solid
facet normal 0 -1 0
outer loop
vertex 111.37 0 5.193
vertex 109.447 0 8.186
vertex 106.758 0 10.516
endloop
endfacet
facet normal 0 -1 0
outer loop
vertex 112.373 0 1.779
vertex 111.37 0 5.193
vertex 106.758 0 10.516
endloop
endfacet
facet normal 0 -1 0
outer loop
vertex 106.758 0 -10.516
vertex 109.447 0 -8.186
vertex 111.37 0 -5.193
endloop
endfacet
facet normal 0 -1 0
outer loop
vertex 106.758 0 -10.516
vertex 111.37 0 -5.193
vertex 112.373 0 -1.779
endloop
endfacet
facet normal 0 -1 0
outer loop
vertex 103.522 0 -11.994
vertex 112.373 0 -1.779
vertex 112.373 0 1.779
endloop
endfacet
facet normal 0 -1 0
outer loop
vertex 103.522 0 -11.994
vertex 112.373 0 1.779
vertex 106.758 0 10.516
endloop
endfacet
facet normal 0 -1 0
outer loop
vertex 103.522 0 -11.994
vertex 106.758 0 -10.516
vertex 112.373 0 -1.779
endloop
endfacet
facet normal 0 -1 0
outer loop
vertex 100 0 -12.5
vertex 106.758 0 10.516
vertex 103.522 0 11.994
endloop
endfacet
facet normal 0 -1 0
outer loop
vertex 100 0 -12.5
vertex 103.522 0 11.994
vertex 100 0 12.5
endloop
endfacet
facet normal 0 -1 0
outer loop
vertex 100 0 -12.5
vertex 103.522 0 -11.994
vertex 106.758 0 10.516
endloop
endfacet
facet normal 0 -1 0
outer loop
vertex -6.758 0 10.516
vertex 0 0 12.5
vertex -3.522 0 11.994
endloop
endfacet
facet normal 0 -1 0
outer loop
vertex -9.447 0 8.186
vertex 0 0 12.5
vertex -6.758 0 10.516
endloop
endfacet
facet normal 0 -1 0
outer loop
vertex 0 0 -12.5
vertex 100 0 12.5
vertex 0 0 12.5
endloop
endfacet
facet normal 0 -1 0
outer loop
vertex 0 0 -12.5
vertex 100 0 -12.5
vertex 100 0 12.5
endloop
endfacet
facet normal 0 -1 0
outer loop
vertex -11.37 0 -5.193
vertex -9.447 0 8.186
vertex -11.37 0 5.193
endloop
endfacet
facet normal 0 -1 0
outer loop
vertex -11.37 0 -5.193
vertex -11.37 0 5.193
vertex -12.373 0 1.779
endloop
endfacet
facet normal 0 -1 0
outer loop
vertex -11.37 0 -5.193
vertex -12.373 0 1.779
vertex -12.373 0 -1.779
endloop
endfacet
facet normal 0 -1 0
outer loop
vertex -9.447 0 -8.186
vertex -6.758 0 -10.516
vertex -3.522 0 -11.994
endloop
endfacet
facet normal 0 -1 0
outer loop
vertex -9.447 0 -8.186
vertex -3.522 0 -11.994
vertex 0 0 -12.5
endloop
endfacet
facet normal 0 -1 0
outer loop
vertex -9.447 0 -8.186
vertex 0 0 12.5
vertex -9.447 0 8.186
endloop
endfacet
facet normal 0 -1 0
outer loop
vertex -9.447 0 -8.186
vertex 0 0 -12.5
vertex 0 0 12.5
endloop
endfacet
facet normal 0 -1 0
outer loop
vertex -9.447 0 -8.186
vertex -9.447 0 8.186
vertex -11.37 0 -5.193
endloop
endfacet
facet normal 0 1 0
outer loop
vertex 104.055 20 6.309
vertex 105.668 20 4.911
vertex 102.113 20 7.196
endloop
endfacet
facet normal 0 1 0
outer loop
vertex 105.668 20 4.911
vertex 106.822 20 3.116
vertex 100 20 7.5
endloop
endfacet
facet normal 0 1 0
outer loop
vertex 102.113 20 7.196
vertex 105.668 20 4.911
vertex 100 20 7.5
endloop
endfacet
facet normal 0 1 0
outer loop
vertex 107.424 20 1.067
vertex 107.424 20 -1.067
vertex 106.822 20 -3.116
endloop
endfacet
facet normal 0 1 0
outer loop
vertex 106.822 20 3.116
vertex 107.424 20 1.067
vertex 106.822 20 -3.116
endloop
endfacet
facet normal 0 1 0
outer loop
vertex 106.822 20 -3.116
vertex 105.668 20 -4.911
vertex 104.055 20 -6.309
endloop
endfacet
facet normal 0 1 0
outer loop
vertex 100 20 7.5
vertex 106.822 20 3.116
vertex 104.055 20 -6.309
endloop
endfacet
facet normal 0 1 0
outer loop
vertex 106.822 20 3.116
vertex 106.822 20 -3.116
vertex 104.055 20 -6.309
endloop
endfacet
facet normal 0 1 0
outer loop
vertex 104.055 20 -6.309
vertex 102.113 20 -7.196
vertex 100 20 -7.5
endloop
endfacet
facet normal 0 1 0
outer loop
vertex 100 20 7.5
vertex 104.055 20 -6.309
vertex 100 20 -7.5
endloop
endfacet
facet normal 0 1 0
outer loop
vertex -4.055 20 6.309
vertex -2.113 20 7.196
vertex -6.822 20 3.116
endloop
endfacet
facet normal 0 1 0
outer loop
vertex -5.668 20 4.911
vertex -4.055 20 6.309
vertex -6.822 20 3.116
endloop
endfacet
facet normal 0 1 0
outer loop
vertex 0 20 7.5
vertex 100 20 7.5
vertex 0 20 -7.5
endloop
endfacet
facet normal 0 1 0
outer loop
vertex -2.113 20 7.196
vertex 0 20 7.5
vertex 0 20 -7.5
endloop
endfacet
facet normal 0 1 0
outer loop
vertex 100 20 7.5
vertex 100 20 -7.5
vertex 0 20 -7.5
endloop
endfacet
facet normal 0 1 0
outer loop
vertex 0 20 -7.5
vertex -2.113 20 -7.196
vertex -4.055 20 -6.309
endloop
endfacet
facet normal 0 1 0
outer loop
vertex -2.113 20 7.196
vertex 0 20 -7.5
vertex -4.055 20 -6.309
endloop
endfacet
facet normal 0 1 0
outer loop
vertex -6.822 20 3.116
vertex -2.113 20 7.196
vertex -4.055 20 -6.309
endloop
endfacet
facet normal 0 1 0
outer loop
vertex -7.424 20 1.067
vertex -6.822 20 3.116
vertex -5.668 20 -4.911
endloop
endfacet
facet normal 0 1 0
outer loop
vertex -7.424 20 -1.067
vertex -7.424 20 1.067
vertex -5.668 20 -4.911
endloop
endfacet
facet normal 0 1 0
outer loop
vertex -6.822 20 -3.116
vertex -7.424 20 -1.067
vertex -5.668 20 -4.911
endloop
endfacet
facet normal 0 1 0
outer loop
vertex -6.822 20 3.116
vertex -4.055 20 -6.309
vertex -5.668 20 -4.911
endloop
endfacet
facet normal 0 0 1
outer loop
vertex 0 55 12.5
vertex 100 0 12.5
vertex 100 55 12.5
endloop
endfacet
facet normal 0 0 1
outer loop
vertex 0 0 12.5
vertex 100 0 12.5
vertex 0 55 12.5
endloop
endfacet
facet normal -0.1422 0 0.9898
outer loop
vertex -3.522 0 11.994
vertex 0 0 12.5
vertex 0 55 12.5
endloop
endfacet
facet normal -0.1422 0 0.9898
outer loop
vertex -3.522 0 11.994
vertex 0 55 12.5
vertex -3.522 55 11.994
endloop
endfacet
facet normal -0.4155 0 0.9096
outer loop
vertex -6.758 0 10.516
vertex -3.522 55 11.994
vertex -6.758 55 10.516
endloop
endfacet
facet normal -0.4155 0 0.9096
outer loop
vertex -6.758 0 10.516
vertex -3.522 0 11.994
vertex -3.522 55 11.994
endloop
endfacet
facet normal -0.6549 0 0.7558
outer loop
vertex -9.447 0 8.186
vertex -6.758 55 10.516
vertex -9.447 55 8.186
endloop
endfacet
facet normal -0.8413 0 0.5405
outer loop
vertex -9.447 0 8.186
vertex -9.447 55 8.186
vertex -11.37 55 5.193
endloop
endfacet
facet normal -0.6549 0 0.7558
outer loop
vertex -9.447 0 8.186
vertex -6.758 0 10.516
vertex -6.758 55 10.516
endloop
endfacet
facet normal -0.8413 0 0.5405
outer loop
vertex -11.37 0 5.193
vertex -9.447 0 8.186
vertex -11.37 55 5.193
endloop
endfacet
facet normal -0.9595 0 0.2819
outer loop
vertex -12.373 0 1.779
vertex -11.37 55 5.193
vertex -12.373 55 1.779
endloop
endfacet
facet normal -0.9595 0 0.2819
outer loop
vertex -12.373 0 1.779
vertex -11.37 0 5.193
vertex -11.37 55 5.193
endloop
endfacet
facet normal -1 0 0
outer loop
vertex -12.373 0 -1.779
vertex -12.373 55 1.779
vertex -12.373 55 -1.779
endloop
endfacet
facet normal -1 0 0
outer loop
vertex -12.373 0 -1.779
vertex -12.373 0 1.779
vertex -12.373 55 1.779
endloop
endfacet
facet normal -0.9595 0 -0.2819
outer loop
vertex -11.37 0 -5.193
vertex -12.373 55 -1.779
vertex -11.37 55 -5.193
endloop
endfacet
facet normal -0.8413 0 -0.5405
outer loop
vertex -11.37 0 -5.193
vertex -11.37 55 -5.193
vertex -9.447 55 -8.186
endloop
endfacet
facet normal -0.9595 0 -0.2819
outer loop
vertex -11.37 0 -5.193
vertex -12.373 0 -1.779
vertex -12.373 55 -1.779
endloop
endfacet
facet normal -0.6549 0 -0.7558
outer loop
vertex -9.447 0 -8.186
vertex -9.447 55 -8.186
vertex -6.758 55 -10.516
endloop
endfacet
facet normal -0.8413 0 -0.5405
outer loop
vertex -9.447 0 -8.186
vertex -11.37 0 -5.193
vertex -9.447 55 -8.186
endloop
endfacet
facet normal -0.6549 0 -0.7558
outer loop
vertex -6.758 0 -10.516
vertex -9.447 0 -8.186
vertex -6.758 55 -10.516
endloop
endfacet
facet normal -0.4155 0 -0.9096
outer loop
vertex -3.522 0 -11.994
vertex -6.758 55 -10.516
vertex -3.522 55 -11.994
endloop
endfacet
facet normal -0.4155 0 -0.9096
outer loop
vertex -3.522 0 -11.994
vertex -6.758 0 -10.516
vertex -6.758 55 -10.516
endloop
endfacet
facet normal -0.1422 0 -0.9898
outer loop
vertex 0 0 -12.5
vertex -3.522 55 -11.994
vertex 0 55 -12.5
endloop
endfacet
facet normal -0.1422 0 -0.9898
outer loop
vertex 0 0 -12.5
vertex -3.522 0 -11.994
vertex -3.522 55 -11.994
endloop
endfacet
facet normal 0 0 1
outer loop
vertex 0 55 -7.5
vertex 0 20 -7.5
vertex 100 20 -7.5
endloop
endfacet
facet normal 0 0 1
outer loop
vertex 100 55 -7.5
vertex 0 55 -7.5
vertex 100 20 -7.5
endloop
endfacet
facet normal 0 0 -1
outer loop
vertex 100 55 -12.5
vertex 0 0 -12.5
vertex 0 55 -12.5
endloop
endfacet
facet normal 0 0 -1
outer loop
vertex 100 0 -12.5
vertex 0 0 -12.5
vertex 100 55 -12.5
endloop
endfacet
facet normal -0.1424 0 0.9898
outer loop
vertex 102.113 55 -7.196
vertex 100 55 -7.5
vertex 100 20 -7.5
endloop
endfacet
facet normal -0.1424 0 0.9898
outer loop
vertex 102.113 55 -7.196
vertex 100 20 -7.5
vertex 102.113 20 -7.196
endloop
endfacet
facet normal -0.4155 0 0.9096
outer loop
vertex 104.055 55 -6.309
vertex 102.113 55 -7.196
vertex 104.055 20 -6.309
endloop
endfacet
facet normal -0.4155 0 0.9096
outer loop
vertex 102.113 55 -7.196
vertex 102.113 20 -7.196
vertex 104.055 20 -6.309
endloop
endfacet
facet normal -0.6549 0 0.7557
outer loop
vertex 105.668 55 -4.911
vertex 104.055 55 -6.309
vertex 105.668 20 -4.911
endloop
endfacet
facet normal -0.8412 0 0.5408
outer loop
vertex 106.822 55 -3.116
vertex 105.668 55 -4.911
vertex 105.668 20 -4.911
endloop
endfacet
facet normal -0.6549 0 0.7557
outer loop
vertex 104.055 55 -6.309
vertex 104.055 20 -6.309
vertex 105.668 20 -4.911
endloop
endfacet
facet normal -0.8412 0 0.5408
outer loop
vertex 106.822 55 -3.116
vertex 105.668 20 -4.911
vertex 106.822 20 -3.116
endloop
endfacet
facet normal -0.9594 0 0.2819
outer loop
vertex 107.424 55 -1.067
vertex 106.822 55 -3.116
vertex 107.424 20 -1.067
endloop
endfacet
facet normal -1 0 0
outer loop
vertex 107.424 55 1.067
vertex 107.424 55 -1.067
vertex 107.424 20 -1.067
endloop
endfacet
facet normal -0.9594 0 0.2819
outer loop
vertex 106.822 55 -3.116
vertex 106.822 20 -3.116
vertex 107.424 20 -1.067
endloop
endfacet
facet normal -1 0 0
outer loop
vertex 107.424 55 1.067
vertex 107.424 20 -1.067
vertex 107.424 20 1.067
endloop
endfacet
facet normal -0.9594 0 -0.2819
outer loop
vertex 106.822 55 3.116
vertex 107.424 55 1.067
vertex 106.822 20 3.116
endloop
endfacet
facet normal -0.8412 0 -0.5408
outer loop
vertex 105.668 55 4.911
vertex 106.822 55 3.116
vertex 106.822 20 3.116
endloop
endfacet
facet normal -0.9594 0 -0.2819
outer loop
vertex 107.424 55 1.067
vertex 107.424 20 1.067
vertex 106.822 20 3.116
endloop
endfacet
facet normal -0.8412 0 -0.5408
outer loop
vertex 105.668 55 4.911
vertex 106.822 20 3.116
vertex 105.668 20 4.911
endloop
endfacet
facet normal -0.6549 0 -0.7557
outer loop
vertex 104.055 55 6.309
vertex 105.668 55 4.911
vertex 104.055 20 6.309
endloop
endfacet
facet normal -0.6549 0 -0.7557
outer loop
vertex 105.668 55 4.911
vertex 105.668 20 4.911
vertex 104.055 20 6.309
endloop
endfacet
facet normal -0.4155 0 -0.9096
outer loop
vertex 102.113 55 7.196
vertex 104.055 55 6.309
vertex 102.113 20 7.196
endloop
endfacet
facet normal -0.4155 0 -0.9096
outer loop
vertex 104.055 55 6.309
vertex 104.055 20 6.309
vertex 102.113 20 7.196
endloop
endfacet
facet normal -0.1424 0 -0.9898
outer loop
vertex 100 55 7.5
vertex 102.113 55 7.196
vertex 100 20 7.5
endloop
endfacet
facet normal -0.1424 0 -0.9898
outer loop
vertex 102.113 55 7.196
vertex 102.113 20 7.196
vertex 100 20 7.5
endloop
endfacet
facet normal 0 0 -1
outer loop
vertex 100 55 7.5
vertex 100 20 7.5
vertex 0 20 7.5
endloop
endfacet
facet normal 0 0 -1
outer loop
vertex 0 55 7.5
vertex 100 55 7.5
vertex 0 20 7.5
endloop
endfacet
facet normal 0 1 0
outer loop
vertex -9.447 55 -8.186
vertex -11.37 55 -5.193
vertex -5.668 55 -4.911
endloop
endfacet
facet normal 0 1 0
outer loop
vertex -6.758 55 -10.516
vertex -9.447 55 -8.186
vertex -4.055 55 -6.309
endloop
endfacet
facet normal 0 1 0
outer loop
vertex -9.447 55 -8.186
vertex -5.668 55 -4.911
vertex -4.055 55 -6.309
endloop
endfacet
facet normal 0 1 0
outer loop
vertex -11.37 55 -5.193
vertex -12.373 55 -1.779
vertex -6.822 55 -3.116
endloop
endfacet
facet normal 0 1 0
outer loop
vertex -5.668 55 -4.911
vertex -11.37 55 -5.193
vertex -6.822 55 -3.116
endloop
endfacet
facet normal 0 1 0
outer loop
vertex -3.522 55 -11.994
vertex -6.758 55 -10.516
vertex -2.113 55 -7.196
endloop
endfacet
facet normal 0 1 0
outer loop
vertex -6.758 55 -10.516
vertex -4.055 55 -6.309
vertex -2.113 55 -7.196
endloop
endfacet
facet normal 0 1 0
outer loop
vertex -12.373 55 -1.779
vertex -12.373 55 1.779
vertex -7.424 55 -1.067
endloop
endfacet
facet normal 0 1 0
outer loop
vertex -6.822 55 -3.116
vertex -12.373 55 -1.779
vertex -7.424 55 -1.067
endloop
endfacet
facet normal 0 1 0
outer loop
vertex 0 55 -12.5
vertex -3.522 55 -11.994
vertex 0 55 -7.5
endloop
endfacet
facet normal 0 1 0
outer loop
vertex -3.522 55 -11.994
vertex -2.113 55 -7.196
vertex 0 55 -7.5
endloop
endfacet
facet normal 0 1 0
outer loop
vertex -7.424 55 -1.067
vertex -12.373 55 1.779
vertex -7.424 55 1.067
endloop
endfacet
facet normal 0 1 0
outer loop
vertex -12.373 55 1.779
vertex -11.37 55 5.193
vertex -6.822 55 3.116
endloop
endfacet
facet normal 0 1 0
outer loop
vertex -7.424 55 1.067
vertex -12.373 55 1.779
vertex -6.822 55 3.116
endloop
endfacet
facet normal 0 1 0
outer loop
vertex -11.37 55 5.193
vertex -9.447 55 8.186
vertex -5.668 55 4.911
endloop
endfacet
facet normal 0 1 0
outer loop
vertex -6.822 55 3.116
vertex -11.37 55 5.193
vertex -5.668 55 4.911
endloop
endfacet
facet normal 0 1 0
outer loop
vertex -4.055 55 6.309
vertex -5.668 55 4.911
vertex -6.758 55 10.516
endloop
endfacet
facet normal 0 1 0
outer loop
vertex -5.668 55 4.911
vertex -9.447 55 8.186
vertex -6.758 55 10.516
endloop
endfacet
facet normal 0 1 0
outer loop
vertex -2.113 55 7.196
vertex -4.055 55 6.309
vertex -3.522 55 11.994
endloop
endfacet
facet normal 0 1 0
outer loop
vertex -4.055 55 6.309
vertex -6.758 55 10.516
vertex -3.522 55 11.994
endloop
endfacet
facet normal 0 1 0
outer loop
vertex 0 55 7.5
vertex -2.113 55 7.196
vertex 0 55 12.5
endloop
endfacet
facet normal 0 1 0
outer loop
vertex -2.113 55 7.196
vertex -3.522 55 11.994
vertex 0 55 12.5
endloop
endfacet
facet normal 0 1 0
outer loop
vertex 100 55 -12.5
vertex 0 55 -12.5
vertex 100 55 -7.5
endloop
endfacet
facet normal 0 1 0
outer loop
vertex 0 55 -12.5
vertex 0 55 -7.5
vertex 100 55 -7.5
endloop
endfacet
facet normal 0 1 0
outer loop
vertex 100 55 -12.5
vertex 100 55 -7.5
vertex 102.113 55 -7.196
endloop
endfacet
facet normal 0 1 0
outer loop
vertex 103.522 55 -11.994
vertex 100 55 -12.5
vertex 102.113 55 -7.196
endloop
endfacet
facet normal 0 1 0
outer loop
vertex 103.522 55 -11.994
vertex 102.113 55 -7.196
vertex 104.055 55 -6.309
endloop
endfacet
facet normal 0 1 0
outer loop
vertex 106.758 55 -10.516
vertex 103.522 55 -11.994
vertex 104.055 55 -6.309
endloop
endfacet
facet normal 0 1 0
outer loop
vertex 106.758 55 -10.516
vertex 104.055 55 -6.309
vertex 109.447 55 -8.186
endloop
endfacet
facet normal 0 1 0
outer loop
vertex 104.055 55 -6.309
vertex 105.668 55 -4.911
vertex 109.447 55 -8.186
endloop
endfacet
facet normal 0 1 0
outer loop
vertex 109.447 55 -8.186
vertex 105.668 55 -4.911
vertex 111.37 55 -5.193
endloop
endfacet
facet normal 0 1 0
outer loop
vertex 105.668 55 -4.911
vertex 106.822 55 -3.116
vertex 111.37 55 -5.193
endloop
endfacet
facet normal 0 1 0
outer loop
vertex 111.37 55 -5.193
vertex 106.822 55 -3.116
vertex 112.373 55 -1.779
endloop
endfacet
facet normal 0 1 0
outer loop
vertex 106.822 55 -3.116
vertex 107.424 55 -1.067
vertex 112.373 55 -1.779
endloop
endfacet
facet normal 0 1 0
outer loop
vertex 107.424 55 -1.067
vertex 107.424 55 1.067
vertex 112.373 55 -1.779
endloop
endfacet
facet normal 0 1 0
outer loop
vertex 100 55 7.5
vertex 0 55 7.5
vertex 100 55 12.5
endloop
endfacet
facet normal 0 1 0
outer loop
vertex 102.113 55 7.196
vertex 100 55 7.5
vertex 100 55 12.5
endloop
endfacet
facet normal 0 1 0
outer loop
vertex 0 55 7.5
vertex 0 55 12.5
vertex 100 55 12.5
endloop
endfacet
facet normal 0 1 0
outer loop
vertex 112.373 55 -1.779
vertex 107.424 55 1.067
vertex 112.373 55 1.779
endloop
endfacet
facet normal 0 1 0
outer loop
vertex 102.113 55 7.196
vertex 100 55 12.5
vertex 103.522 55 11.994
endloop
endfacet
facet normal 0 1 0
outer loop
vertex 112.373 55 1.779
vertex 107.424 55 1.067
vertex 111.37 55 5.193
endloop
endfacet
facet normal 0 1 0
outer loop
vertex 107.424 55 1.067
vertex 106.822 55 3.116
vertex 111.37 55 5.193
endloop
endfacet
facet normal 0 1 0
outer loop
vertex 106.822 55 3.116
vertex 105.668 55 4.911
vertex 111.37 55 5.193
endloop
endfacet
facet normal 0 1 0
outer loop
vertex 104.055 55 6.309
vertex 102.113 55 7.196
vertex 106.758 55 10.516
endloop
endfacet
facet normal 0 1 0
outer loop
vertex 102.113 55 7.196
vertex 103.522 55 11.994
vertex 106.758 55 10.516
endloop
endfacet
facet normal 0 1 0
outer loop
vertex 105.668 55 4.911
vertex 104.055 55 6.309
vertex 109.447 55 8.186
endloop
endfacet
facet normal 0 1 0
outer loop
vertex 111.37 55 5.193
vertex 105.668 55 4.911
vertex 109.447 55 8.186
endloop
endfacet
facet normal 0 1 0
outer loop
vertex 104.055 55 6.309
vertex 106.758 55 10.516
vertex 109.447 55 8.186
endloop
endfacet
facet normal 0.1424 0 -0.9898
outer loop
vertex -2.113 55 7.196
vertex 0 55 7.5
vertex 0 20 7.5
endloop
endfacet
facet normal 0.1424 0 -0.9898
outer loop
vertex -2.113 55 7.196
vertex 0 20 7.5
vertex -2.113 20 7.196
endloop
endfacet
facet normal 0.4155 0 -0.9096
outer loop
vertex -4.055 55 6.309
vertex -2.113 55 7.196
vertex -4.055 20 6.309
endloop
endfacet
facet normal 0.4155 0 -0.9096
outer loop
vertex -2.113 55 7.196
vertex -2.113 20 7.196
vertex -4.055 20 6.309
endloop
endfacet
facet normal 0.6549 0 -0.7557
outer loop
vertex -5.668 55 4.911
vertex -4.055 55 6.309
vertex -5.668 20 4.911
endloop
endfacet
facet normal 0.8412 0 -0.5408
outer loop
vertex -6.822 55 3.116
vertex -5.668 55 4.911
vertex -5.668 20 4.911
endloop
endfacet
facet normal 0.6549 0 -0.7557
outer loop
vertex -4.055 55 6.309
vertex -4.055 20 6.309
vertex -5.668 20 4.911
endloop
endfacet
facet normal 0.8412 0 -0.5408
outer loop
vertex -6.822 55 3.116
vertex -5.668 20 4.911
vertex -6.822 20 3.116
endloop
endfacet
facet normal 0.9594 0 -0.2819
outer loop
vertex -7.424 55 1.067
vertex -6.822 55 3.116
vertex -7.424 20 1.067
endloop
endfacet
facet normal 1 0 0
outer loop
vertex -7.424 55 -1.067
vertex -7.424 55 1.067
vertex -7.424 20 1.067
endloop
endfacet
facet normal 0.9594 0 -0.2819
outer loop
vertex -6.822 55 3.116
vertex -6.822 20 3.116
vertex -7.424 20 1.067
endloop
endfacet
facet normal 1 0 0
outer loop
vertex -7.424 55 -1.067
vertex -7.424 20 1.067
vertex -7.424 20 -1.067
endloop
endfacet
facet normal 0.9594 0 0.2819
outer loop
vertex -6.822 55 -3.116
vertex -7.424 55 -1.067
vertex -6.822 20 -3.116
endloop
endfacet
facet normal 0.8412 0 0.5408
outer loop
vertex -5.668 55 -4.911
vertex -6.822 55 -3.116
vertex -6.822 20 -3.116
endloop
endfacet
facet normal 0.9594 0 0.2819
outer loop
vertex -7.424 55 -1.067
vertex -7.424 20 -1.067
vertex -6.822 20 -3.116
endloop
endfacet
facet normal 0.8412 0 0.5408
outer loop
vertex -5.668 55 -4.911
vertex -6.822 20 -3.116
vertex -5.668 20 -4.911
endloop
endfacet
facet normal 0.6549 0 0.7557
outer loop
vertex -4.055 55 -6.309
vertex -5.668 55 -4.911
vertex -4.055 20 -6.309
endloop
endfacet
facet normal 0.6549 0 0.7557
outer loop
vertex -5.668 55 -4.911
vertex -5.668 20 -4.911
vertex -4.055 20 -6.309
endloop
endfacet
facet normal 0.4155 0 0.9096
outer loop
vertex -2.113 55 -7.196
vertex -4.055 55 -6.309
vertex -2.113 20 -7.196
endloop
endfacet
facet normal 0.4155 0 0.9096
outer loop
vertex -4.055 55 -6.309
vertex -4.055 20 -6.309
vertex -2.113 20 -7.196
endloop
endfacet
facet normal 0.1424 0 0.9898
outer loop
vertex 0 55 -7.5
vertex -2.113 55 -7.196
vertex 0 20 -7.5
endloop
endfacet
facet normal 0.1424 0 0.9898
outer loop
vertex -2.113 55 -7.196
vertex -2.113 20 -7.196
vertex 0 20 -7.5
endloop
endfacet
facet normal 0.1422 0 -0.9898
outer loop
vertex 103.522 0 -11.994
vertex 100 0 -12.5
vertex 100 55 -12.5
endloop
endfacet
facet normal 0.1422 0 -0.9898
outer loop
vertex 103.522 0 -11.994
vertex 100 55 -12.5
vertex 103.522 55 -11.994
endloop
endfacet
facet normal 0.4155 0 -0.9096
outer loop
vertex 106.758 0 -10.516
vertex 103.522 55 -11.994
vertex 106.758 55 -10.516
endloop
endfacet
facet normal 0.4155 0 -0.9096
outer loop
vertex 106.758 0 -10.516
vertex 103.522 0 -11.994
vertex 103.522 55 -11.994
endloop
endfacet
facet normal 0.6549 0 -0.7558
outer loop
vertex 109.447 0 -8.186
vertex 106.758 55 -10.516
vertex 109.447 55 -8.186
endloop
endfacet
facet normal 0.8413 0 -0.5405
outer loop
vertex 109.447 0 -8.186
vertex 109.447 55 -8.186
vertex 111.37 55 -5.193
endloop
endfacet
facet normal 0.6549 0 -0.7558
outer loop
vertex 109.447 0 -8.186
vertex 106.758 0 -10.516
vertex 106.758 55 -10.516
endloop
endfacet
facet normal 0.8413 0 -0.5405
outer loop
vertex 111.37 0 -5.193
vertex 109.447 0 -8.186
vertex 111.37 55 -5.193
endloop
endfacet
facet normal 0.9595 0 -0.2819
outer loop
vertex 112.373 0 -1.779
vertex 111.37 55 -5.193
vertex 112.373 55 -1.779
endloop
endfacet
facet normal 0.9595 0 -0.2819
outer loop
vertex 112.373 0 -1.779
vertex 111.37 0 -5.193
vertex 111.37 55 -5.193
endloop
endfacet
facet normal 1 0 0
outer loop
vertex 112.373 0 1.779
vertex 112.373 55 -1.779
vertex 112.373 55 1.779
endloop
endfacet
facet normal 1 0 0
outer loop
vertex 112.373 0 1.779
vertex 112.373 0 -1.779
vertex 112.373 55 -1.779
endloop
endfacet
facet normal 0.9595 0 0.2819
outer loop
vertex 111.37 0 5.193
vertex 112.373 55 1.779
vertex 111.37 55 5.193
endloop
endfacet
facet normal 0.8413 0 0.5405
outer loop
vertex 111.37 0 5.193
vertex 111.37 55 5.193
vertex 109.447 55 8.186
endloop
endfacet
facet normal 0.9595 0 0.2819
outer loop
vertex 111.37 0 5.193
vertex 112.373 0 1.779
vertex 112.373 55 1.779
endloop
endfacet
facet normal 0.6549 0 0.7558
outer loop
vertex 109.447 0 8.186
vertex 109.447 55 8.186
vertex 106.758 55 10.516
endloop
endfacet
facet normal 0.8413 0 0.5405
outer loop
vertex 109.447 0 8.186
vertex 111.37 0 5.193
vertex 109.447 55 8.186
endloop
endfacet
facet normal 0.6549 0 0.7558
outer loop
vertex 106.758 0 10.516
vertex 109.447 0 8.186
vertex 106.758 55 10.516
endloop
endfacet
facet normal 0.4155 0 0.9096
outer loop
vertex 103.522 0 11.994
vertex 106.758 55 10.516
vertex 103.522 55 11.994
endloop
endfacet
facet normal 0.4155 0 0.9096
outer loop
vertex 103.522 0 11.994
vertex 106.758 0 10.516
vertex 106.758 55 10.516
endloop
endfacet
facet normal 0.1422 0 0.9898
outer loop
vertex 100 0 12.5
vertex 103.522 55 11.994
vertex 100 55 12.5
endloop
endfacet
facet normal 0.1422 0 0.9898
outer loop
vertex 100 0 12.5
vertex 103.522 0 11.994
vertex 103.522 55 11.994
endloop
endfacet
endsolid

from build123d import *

# Parameters (mm, degrees)
EXTRUDE_1_DEPTH   = 20
EXTRUDE_1_2_DEPTH = 55


with BuildPart() as part:
    # 草图1 → Extrude 1 (new body)
    with BuildSketch(Plane(origin=(0, 0, 0), x_dir=(1, 0, 0), z_dir=(0, 1, 0))):
        with BuildLine():
            Line((0, 12.5), (100, 12.5))
            ThreePointArc((100, 12.5), (112.5, 0), (100, -12.5))
            Line((100, -12.5), (0, -12.5))
            ThreePointArc((0, -12.5), (-12.5, 0), (0, 12.5))
        make_face()
    extrude(amount=EXTRUDE_1_DEPTH)

    # 草图2 → Extrude 1 2 (add)
    with BuildSketch(Plane.XZ):
        with BuildLine():
            Line((100, 12.5), (0, 12.5))
            ThreePointArc((0, 12.5), (-12.5, 0), (0, -12.5))
            Line((0, -12.5), (100, -12.5))
            ThreePointArc((100, -12.5), (112.5, 0), (100, 12.5))
        make_face()
        with BuildLine():
            Line((100, 7.5), (0, 7.5))
            ThreePointArc((0, 7.5), (-7.5, 0), (0, -7.5))
            Line((0, -7.5), (100, -7.5))
            ThreePointArc((100, -7.5), (107.5, 0), (100, 7.5))
        make_face(mode=Mode.SUBTRACT)
    extrude(amount=-EXTRUDE_1_2_DEPTH)


solid = part.part
